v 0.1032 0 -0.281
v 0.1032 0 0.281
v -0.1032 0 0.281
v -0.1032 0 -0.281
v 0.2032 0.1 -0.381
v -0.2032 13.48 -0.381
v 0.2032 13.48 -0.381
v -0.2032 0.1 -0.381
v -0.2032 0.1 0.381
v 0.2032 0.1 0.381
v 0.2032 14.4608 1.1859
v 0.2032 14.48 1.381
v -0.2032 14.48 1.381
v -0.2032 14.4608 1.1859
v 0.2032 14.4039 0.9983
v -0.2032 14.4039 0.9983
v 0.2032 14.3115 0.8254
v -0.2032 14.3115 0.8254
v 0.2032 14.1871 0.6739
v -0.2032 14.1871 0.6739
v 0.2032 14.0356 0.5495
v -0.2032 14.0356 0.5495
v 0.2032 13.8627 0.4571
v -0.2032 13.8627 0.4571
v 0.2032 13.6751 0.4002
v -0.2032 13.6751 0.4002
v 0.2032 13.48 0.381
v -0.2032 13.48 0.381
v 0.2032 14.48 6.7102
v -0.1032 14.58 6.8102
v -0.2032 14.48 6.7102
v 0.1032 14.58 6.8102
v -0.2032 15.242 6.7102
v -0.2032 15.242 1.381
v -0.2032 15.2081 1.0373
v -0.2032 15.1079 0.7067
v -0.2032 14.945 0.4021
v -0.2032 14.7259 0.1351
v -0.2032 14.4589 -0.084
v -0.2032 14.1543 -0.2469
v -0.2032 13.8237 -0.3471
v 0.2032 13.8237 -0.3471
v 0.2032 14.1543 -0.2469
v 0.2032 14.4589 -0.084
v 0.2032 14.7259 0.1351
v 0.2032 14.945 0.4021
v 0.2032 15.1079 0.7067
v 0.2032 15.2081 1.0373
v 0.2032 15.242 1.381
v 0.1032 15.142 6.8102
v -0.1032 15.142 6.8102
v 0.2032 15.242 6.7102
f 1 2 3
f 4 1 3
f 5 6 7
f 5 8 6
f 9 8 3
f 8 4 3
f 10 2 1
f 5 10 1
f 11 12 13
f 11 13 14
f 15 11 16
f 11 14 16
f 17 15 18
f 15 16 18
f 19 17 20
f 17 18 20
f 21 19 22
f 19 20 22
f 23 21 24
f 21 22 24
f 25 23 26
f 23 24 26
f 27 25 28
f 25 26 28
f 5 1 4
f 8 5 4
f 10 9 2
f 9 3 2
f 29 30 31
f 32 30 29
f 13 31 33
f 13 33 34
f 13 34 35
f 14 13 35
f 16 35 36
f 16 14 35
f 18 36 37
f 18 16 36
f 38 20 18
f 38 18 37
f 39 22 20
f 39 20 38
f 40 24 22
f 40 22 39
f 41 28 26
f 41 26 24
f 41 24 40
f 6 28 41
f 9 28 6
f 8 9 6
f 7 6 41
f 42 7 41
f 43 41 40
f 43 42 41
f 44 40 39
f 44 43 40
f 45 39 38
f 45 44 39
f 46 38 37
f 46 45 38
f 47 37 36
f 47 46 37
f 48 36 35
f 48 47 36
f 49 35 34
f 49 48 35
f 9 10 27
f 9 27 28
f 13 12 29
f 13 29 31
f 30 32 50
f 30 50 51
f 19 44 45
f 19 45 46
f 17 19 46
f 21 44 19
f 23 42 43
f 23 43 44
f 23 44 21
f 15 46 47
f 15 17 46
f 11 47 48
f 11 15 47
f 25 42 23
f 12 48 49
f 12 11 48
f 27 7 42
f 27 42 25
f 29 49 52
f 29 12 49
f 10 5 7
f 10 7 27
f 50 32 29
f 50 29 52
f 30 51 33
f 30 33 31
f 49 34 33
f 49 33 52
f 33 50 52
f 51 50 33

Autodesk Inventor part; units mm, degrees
ref_plane "YZ Plane" through (0, 0, 0) normal (1, 0, 0) x (0, 1, 0)
ref_plane "XZ Plane" through (0, 0, 0) normal (0, 1, 0) x (-1, 0, 0)
ref_plane "XY Plane" through (0, 0, 0) normal (0, 0, 1) x (1, 0, 0)
sketch "Sketch1" plane through (0, 0, 0) normal (0, 1, 0) x (-1, 0, 0)
  line L0 (0.2032, -0.381) -> (-0.2032, -0.381)
  line L1 (-0.2032, -0.381) -> (-0.2032, 0.381)
  line L2 (-0.2032, 0.381) -> (0.2032, 0.381)
  line L3 (0.2032, 0.381) -> (0.2032, -0.381)
  line L4 (0.2032, -0.381) -> (-0.2032, 0.381) construction
  line L5 (-0.2032, -0.381) -> (0.2032, 0.381) construction
  point P0 (0, 0)
  dimension "d0" = 0.4064
  dimension "d1" = 0.762
extrude "Extrusion1" add sketch "Sketch1" along normal blind 20.48
chamfer "Chamfer1" distance 0.1 angle 45 8 edges at (0.2032, 20.48, 0) (0, 20.48, -0.381) (0, 20.48, 0.381) (-0.2032, 20.48, 0) (0.2032, 0, 0) (0, 0, -0.381) (0, 0, 0.381) (-0.2032, 0, 0)
sketch "Sketch2" plane through (-0.2032, 0.1, 0.381) normal (0, 0, 1) x (1, 0, 0)
  line L0 (-1.0405, 13.38) -> (1.7368, 13.38)
  point P0 (0.2032, -0.1)
  dimension "d7" = 13.48
bend part "Bend Part1" radius 1 angle 90 line through (-1.2437, 13.48, 0.381) along (1, 0, 0) centre toward (0, 0, 1) moving side (0, 1, 0) both sides no
properties part number "PinRight1" material "Gold"
